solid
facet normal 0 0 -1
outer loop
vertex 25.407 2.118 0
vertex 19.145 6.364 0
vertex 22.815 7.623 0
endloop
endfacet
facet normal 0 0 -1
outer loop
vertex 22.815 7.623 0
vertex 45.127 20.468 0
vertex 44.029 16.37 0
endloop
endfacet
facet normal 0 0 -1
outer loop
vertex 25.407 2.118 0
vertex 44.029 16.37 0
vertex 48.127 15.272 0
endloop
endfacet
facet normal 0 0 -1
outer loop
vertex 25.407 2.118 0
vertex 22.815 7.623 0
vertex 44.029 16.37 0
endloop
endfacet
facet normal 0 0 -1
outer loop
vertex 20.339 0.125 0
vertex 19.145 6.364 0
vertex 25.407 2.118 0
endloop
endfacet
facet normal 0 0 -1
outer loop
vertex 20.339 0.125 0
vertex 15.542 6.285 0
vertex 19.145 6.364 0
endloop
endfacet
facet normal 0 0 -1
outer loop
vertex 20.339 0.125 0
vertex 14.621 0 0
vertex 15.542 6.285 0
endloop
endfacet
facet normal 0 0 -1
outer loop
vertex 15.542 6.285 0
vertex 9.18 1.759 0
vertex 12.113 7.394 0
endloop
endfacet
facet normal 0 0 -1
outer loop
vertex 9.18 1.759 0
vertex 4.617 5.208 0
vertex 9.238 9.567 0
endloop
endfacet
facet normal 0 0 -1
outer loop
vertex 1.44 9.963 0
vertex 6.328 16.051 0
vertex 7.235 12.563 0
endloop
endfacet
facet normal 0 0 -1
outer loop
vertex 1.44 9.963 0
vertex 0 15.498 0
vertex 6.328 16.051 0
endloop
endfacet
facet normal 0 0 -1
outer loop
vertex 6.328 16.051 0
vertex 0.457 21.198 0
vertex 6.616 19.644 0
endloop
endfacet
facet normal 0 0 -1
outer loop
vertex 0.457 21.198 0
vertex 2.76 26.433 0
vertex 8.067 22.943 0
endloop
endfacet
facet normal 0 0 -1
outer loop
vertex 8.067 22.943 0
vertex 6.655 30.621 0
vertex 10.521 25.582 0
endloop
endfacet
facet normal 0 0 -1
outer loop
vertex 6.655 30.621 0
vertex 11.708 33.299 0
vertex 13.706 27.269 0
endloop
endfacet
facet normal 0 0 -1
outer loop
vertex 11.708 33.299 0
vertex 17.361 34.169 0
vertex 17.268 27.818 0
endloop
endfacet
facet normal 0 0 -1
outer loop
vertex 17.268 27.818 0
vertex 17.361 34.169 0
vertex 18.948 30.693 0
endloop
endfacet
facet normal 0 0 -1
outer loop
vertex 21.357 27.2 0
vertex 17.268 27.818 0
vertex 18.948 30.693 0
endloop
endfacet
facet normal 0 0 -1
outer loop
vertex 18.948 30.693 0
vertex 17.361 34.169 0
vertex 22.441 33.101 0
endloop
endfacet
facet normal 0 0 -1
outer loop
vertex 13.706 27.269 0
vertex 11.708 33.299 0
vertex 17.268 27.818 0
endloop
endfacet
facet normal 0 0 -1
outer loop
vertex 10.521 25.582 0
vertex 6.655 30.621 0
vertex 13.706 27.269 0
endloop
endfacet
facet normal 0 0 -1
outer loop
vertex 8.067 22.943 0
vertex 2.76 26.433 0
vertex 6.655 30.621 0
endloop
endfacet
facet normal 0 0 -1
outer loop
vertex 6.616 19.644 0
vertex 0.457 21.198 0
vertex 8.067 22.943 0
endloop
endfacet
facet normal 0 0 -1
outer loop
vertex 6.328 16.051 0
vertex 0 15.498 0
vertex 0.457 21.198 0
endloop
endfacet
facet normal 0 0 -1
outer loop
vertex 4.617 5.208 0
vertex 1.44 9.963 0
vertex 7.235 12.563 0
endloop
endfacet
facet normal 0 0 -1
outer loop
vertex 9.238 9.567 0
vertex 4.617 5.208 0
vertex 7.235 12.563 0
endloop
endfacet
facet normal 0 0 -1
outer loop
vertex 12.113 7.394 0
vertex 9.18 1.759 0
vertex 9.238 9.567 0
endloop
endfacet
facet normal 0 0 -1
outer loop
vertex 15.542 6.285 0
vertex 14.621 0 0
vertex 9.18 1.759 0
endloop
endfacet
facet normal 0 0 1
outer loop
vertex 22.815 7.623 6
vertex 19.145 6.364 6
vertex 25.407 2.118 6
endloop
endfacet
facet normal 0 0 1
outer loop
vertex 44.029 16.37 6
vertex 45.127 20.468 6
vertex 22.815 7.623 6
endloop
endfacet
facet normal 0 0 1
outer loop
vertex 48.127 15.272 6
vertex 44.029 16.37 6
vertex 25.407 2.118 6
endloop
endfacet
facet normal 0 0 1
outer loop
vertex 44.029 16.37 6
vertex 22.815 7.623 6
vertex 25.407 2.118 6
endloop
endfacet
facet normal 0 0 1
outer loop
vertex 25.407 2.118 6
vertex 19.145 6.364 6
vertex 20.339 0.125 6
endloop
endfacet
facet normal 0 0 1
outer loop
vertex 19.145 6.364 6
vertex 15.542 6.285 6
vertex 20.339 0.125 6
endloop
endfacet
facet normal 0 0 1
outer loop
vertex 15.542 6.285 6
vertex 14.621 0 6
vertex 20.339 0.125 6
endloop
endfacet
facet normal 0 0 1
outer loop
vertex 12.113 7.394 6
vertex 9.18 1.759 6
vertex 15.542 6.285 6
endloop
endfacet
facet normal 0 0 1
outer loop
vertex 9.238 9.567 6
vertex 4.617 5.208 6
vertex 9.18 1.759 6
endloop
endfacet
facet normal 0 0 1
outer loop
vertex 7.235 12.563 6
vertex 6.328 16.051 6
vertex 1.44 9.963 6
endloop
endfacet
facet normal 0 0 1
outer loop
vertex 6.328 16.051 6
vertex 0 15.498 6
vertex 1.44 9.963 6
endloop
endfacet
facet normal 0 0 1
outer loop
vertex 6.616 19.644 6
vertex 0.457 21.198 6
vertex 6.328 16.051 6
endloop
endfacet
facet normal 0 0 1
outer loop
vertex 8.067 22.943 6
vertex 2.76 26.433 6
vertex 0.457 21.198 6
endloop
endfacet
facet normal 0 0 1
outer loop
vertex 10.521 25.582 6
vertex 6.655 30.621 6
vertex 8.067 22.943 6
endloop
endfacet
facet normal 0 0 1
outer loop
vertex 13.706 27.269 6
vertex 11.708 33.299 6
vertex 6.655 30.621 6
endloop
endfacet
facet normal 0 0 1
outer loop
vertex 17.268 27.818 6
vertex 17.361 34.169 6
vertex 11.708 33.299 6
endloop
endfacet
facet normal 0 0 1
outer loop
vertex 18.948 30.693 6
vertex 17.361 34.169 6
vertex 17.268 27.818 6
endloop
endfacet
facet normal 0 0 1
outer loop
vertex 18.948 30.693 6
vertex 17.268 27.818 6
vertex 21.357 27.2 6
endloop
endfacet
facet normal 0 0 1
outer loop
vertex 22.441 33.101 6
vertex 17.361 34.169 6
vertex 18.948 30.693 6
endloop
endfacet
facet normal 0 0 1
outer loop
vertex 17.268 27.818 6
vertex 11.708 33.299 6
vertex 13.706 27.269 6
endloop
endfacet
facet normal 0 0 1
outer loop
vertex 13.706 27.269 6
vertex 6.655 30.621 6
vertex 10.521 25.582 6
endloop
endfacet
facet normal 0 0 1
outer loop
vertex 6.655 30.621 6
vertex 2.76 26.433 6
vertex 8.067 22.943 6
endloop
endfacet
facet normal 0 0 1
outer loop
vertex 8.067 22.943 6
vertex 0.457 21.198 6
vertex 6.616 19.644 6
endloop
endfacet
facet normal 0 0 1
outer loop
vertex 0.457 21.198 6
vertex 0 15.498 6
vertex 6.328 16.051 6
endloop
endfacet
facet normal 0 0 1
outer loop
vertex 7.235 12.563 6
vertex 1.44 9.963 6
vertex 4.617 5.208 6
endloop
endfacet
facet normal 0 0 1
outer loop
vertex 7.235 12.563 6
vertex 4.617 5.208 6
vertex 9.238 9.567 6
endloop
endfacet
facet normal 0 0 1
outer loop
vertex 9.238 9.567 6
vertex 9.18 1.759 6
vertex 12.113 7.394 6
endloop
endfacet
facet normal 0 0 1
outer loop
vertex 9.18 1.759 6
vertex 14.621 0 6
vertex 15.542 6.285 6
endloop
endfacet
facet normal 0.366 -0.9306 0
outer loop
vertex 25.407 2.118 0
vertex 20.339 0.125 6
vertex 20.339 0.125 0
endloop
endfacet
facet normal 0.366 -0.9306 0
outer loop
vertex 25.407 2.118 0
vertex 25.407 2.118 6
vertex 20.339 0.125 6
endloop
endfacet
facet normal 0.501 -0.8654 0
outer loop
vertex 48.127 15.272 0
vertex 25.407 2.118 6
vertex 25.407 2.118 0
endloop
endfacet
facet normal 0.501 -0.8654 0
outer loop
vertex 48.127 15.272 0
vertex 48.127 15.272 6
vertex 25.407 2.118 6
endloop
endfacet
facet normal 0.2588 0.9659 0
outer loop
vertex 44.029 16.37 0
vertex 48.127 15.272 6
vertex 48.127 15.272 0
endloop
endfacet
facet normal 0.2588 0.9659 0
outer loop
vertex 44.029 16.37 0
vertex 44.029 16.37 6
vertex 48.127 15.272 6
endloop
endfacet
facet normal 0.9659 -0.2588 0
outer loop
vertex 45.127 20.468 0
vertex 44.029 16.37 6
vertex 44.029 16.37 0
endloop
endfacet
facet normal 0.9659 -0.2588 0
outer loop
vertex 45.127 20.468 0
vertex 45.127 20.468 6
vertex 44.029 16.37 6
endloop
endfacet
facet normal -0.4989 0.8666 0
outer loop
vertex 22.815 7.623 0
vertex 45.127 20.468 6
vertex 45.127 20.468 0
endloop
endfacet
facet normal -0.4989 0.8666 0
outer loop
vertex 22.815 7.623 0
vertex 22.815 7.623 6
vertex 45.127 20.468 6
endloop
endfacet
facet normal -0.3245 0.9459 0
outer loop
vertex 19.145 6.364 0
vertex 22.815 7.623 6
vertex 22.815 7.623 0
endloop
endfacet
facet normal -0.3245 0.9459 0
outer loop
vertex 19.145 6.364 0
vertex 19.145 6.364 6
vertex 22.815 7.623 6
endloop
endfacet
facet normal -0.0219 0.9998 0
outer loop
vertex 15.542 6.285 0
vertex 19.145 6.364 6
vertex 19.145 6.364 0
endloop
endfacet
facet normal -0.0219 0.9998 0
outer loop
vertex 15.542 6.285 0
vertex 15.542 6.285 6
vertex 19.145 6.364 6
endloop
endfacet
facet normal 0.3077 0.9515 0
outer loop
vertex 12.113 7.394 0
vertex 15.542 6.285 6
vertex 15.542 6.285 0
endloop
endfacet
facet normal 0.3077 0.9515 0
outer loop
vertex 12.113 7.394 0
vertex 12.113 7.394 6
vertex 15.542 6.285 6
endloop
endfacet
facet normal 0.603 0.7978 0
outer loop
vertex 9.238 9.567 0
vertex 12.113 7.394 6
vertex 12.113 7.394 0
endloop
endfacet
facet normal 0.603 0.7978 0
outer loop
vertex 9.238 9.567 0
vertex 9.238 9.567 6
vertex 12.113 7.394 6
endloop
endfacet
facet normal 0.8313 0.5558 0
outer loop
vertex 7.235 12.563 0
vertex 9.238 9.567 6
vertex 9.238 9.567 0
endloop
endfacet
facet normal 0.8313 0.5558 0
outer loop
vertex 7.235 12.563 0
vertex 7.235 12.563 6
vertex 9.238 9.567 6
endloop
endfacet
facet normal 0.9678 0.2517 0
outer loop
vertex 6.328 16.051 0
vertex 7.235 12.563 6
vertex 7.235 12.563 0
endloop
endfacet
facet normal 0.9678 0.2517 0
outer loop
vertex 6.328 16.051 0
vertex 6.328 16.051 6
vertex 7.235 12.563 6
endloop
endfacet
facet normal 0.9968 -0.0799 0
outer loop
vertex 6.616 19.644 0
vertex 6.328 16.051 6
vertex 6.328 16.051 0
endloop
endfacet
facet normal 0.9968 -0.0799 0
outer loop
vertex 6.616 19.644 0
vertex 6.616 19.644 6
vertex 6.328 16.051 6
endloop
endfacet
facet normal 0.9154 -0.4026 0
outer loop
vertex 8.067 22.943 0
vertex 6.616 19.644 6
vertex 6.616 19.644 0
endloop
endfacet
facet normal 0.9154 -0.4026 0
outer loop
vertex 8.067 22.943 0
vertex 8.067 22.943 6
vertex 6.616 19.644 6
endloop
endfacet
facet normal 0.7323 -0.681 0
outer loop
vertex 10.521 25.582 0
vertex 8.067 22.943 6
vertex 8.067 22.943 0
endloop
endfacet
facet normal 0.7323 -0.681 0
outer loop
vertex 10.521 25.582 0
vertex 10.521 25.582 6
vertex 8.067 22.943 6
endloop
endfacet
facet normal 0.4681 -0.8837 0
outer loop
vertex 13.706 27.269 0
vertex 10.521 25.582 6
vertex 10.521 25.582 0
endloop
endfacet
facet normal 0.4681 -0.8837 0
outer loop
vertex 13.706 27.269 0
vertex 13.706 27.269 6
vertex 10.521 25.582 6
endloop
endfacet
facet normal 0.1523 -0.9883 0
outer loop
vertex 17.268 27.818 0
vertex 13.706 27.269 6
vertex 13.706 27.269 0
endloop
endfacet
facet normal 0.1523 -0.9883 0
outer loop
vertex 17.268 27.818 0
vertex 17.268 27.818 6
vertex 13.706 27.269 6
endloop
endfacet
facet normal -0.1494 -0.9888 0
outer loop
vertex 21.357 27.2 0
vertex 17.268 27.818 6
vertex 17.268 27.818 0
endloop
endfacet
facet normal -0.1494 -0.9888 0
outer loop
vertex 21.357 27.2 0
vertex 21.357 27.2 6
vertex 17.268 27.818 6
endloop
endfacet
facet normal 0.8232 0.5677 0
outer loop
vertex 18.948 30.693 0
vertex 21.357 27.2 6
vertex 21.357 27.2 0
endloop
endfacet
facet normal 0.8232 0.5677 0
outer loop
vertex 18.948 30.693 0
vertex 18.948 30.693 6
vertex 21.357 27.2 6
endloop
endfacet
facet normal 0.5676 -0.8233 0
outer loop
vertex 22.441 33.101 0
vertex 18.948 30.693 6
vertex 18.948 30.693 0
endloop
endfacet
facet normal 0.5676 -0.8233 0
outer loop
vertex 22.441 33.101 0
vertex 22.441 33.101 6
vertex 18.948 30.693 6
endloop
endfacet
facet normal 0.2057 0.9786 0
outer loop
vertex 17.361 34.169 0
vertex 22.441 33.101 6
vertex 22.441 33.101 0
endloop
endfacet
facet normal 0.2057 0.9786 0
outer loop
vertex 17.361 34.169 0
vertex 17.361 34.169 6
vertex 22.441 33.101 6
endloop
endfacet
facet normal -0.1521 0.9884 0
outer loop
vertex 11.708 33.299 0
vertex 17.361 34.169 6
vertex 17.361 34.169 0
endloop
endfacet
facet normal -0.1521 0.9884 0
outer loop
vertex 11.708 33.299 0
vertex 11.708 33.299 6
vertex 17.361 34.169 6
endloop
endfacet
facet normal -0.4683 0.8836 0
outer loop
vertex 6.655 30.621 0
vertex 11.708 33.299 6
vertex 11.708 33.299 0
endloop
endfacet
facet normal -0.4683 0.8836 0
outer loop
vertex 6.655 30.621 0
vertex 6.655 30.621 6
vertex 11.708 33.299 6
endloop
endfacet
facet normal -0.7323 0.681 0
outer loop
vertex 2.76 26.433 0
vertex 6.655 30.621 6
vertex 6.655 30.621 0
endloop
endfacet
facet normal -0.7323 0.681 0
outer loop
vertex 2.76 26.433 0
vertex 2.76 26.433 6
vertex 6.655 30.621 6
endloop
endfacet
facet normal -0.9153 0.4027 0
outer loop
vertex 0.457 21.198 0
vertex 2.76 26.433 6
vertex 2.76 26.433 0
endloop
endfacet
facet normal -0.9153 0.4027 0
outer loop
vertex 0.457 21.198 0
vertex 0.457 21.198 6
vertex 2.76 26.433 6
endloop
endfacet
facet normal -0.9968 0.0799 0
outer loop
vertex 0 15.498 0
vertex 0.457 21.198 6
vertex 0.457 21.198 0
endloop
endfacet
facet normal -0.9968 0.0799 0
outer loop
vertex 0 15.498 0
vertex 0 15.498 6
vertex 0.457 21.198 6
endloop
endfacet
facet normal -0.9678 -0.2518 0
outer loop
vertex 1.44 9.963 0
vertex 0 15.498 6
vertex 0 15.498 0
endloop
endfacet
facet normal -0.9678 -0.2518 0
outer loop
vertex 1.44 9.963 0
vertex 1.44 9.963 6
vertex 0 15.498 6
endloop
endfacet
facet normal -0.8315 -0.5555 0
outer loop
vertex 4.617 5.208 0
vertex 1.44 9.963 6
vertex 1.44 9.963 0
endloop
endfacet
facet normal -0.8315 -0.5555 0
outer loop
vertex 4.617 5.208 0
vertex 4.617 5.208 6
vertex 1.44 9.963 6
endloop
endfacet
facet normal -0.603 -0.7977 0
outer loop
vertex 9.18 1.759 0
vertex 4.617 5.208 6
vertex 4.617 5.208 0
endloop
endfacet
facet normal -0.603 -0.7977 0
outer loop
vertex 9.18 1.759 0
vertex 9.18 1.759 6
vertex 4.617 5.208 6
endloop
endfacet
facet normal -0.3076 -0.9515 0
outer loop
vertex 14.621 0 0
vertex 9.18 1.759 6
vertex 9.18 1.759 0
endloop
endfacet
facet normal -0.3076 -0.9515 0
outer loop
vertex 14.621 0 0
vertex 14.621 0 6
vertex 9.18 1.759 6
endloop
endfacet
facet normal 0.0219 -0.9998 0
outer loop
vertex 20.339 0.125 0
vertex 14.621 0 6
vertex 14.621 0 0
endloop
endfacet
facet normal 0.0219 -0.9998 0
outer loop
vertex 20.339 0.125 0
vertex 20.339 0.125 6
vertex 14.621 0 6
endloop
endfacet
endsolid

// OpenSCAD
$fn = 32;

// ----------------------------------------------------------------------
// Eye lug: ring_tail, 6 mm thick
// ----------------------------------------------------------------------

// --- parameters (mm) ---
profile_height = 6;       // extrusion height
profile_points = 30;      // points of the closed outline

profile = [[18.948, 30.693], [22.441, 33.101], [17.361, 34.169], [11.708, 33.299], [6.655, 30.621], [2.76, 26.433], [0.457, 21.198], [0, 15.498], [1.44, 9.963], [4.617, 5.208], [9.18, 1.759], [14.621, 0], [20.339, 0.125], [25.407, 2.118], [48.127, 15.272], [44.029, 16.37], [45.127, 20.468], [22.815, 7.623], [19.145, 6.364], [15.542, 6.285], [12.113, 7.394], [9.238, 9.567], [7.235, 12.563], [6.328, 16.051], [6.616, 19.644], [8.067, 22.943], [10.521, 25.582], [13.706, 27.269], [17.268, 27.818], [21.357, 27.2]];  // single closed polygon, 30 points, counter clockwise

// --- the one profile operation ---
linear_extrude(height = profile_height) polygon(points = profile);
